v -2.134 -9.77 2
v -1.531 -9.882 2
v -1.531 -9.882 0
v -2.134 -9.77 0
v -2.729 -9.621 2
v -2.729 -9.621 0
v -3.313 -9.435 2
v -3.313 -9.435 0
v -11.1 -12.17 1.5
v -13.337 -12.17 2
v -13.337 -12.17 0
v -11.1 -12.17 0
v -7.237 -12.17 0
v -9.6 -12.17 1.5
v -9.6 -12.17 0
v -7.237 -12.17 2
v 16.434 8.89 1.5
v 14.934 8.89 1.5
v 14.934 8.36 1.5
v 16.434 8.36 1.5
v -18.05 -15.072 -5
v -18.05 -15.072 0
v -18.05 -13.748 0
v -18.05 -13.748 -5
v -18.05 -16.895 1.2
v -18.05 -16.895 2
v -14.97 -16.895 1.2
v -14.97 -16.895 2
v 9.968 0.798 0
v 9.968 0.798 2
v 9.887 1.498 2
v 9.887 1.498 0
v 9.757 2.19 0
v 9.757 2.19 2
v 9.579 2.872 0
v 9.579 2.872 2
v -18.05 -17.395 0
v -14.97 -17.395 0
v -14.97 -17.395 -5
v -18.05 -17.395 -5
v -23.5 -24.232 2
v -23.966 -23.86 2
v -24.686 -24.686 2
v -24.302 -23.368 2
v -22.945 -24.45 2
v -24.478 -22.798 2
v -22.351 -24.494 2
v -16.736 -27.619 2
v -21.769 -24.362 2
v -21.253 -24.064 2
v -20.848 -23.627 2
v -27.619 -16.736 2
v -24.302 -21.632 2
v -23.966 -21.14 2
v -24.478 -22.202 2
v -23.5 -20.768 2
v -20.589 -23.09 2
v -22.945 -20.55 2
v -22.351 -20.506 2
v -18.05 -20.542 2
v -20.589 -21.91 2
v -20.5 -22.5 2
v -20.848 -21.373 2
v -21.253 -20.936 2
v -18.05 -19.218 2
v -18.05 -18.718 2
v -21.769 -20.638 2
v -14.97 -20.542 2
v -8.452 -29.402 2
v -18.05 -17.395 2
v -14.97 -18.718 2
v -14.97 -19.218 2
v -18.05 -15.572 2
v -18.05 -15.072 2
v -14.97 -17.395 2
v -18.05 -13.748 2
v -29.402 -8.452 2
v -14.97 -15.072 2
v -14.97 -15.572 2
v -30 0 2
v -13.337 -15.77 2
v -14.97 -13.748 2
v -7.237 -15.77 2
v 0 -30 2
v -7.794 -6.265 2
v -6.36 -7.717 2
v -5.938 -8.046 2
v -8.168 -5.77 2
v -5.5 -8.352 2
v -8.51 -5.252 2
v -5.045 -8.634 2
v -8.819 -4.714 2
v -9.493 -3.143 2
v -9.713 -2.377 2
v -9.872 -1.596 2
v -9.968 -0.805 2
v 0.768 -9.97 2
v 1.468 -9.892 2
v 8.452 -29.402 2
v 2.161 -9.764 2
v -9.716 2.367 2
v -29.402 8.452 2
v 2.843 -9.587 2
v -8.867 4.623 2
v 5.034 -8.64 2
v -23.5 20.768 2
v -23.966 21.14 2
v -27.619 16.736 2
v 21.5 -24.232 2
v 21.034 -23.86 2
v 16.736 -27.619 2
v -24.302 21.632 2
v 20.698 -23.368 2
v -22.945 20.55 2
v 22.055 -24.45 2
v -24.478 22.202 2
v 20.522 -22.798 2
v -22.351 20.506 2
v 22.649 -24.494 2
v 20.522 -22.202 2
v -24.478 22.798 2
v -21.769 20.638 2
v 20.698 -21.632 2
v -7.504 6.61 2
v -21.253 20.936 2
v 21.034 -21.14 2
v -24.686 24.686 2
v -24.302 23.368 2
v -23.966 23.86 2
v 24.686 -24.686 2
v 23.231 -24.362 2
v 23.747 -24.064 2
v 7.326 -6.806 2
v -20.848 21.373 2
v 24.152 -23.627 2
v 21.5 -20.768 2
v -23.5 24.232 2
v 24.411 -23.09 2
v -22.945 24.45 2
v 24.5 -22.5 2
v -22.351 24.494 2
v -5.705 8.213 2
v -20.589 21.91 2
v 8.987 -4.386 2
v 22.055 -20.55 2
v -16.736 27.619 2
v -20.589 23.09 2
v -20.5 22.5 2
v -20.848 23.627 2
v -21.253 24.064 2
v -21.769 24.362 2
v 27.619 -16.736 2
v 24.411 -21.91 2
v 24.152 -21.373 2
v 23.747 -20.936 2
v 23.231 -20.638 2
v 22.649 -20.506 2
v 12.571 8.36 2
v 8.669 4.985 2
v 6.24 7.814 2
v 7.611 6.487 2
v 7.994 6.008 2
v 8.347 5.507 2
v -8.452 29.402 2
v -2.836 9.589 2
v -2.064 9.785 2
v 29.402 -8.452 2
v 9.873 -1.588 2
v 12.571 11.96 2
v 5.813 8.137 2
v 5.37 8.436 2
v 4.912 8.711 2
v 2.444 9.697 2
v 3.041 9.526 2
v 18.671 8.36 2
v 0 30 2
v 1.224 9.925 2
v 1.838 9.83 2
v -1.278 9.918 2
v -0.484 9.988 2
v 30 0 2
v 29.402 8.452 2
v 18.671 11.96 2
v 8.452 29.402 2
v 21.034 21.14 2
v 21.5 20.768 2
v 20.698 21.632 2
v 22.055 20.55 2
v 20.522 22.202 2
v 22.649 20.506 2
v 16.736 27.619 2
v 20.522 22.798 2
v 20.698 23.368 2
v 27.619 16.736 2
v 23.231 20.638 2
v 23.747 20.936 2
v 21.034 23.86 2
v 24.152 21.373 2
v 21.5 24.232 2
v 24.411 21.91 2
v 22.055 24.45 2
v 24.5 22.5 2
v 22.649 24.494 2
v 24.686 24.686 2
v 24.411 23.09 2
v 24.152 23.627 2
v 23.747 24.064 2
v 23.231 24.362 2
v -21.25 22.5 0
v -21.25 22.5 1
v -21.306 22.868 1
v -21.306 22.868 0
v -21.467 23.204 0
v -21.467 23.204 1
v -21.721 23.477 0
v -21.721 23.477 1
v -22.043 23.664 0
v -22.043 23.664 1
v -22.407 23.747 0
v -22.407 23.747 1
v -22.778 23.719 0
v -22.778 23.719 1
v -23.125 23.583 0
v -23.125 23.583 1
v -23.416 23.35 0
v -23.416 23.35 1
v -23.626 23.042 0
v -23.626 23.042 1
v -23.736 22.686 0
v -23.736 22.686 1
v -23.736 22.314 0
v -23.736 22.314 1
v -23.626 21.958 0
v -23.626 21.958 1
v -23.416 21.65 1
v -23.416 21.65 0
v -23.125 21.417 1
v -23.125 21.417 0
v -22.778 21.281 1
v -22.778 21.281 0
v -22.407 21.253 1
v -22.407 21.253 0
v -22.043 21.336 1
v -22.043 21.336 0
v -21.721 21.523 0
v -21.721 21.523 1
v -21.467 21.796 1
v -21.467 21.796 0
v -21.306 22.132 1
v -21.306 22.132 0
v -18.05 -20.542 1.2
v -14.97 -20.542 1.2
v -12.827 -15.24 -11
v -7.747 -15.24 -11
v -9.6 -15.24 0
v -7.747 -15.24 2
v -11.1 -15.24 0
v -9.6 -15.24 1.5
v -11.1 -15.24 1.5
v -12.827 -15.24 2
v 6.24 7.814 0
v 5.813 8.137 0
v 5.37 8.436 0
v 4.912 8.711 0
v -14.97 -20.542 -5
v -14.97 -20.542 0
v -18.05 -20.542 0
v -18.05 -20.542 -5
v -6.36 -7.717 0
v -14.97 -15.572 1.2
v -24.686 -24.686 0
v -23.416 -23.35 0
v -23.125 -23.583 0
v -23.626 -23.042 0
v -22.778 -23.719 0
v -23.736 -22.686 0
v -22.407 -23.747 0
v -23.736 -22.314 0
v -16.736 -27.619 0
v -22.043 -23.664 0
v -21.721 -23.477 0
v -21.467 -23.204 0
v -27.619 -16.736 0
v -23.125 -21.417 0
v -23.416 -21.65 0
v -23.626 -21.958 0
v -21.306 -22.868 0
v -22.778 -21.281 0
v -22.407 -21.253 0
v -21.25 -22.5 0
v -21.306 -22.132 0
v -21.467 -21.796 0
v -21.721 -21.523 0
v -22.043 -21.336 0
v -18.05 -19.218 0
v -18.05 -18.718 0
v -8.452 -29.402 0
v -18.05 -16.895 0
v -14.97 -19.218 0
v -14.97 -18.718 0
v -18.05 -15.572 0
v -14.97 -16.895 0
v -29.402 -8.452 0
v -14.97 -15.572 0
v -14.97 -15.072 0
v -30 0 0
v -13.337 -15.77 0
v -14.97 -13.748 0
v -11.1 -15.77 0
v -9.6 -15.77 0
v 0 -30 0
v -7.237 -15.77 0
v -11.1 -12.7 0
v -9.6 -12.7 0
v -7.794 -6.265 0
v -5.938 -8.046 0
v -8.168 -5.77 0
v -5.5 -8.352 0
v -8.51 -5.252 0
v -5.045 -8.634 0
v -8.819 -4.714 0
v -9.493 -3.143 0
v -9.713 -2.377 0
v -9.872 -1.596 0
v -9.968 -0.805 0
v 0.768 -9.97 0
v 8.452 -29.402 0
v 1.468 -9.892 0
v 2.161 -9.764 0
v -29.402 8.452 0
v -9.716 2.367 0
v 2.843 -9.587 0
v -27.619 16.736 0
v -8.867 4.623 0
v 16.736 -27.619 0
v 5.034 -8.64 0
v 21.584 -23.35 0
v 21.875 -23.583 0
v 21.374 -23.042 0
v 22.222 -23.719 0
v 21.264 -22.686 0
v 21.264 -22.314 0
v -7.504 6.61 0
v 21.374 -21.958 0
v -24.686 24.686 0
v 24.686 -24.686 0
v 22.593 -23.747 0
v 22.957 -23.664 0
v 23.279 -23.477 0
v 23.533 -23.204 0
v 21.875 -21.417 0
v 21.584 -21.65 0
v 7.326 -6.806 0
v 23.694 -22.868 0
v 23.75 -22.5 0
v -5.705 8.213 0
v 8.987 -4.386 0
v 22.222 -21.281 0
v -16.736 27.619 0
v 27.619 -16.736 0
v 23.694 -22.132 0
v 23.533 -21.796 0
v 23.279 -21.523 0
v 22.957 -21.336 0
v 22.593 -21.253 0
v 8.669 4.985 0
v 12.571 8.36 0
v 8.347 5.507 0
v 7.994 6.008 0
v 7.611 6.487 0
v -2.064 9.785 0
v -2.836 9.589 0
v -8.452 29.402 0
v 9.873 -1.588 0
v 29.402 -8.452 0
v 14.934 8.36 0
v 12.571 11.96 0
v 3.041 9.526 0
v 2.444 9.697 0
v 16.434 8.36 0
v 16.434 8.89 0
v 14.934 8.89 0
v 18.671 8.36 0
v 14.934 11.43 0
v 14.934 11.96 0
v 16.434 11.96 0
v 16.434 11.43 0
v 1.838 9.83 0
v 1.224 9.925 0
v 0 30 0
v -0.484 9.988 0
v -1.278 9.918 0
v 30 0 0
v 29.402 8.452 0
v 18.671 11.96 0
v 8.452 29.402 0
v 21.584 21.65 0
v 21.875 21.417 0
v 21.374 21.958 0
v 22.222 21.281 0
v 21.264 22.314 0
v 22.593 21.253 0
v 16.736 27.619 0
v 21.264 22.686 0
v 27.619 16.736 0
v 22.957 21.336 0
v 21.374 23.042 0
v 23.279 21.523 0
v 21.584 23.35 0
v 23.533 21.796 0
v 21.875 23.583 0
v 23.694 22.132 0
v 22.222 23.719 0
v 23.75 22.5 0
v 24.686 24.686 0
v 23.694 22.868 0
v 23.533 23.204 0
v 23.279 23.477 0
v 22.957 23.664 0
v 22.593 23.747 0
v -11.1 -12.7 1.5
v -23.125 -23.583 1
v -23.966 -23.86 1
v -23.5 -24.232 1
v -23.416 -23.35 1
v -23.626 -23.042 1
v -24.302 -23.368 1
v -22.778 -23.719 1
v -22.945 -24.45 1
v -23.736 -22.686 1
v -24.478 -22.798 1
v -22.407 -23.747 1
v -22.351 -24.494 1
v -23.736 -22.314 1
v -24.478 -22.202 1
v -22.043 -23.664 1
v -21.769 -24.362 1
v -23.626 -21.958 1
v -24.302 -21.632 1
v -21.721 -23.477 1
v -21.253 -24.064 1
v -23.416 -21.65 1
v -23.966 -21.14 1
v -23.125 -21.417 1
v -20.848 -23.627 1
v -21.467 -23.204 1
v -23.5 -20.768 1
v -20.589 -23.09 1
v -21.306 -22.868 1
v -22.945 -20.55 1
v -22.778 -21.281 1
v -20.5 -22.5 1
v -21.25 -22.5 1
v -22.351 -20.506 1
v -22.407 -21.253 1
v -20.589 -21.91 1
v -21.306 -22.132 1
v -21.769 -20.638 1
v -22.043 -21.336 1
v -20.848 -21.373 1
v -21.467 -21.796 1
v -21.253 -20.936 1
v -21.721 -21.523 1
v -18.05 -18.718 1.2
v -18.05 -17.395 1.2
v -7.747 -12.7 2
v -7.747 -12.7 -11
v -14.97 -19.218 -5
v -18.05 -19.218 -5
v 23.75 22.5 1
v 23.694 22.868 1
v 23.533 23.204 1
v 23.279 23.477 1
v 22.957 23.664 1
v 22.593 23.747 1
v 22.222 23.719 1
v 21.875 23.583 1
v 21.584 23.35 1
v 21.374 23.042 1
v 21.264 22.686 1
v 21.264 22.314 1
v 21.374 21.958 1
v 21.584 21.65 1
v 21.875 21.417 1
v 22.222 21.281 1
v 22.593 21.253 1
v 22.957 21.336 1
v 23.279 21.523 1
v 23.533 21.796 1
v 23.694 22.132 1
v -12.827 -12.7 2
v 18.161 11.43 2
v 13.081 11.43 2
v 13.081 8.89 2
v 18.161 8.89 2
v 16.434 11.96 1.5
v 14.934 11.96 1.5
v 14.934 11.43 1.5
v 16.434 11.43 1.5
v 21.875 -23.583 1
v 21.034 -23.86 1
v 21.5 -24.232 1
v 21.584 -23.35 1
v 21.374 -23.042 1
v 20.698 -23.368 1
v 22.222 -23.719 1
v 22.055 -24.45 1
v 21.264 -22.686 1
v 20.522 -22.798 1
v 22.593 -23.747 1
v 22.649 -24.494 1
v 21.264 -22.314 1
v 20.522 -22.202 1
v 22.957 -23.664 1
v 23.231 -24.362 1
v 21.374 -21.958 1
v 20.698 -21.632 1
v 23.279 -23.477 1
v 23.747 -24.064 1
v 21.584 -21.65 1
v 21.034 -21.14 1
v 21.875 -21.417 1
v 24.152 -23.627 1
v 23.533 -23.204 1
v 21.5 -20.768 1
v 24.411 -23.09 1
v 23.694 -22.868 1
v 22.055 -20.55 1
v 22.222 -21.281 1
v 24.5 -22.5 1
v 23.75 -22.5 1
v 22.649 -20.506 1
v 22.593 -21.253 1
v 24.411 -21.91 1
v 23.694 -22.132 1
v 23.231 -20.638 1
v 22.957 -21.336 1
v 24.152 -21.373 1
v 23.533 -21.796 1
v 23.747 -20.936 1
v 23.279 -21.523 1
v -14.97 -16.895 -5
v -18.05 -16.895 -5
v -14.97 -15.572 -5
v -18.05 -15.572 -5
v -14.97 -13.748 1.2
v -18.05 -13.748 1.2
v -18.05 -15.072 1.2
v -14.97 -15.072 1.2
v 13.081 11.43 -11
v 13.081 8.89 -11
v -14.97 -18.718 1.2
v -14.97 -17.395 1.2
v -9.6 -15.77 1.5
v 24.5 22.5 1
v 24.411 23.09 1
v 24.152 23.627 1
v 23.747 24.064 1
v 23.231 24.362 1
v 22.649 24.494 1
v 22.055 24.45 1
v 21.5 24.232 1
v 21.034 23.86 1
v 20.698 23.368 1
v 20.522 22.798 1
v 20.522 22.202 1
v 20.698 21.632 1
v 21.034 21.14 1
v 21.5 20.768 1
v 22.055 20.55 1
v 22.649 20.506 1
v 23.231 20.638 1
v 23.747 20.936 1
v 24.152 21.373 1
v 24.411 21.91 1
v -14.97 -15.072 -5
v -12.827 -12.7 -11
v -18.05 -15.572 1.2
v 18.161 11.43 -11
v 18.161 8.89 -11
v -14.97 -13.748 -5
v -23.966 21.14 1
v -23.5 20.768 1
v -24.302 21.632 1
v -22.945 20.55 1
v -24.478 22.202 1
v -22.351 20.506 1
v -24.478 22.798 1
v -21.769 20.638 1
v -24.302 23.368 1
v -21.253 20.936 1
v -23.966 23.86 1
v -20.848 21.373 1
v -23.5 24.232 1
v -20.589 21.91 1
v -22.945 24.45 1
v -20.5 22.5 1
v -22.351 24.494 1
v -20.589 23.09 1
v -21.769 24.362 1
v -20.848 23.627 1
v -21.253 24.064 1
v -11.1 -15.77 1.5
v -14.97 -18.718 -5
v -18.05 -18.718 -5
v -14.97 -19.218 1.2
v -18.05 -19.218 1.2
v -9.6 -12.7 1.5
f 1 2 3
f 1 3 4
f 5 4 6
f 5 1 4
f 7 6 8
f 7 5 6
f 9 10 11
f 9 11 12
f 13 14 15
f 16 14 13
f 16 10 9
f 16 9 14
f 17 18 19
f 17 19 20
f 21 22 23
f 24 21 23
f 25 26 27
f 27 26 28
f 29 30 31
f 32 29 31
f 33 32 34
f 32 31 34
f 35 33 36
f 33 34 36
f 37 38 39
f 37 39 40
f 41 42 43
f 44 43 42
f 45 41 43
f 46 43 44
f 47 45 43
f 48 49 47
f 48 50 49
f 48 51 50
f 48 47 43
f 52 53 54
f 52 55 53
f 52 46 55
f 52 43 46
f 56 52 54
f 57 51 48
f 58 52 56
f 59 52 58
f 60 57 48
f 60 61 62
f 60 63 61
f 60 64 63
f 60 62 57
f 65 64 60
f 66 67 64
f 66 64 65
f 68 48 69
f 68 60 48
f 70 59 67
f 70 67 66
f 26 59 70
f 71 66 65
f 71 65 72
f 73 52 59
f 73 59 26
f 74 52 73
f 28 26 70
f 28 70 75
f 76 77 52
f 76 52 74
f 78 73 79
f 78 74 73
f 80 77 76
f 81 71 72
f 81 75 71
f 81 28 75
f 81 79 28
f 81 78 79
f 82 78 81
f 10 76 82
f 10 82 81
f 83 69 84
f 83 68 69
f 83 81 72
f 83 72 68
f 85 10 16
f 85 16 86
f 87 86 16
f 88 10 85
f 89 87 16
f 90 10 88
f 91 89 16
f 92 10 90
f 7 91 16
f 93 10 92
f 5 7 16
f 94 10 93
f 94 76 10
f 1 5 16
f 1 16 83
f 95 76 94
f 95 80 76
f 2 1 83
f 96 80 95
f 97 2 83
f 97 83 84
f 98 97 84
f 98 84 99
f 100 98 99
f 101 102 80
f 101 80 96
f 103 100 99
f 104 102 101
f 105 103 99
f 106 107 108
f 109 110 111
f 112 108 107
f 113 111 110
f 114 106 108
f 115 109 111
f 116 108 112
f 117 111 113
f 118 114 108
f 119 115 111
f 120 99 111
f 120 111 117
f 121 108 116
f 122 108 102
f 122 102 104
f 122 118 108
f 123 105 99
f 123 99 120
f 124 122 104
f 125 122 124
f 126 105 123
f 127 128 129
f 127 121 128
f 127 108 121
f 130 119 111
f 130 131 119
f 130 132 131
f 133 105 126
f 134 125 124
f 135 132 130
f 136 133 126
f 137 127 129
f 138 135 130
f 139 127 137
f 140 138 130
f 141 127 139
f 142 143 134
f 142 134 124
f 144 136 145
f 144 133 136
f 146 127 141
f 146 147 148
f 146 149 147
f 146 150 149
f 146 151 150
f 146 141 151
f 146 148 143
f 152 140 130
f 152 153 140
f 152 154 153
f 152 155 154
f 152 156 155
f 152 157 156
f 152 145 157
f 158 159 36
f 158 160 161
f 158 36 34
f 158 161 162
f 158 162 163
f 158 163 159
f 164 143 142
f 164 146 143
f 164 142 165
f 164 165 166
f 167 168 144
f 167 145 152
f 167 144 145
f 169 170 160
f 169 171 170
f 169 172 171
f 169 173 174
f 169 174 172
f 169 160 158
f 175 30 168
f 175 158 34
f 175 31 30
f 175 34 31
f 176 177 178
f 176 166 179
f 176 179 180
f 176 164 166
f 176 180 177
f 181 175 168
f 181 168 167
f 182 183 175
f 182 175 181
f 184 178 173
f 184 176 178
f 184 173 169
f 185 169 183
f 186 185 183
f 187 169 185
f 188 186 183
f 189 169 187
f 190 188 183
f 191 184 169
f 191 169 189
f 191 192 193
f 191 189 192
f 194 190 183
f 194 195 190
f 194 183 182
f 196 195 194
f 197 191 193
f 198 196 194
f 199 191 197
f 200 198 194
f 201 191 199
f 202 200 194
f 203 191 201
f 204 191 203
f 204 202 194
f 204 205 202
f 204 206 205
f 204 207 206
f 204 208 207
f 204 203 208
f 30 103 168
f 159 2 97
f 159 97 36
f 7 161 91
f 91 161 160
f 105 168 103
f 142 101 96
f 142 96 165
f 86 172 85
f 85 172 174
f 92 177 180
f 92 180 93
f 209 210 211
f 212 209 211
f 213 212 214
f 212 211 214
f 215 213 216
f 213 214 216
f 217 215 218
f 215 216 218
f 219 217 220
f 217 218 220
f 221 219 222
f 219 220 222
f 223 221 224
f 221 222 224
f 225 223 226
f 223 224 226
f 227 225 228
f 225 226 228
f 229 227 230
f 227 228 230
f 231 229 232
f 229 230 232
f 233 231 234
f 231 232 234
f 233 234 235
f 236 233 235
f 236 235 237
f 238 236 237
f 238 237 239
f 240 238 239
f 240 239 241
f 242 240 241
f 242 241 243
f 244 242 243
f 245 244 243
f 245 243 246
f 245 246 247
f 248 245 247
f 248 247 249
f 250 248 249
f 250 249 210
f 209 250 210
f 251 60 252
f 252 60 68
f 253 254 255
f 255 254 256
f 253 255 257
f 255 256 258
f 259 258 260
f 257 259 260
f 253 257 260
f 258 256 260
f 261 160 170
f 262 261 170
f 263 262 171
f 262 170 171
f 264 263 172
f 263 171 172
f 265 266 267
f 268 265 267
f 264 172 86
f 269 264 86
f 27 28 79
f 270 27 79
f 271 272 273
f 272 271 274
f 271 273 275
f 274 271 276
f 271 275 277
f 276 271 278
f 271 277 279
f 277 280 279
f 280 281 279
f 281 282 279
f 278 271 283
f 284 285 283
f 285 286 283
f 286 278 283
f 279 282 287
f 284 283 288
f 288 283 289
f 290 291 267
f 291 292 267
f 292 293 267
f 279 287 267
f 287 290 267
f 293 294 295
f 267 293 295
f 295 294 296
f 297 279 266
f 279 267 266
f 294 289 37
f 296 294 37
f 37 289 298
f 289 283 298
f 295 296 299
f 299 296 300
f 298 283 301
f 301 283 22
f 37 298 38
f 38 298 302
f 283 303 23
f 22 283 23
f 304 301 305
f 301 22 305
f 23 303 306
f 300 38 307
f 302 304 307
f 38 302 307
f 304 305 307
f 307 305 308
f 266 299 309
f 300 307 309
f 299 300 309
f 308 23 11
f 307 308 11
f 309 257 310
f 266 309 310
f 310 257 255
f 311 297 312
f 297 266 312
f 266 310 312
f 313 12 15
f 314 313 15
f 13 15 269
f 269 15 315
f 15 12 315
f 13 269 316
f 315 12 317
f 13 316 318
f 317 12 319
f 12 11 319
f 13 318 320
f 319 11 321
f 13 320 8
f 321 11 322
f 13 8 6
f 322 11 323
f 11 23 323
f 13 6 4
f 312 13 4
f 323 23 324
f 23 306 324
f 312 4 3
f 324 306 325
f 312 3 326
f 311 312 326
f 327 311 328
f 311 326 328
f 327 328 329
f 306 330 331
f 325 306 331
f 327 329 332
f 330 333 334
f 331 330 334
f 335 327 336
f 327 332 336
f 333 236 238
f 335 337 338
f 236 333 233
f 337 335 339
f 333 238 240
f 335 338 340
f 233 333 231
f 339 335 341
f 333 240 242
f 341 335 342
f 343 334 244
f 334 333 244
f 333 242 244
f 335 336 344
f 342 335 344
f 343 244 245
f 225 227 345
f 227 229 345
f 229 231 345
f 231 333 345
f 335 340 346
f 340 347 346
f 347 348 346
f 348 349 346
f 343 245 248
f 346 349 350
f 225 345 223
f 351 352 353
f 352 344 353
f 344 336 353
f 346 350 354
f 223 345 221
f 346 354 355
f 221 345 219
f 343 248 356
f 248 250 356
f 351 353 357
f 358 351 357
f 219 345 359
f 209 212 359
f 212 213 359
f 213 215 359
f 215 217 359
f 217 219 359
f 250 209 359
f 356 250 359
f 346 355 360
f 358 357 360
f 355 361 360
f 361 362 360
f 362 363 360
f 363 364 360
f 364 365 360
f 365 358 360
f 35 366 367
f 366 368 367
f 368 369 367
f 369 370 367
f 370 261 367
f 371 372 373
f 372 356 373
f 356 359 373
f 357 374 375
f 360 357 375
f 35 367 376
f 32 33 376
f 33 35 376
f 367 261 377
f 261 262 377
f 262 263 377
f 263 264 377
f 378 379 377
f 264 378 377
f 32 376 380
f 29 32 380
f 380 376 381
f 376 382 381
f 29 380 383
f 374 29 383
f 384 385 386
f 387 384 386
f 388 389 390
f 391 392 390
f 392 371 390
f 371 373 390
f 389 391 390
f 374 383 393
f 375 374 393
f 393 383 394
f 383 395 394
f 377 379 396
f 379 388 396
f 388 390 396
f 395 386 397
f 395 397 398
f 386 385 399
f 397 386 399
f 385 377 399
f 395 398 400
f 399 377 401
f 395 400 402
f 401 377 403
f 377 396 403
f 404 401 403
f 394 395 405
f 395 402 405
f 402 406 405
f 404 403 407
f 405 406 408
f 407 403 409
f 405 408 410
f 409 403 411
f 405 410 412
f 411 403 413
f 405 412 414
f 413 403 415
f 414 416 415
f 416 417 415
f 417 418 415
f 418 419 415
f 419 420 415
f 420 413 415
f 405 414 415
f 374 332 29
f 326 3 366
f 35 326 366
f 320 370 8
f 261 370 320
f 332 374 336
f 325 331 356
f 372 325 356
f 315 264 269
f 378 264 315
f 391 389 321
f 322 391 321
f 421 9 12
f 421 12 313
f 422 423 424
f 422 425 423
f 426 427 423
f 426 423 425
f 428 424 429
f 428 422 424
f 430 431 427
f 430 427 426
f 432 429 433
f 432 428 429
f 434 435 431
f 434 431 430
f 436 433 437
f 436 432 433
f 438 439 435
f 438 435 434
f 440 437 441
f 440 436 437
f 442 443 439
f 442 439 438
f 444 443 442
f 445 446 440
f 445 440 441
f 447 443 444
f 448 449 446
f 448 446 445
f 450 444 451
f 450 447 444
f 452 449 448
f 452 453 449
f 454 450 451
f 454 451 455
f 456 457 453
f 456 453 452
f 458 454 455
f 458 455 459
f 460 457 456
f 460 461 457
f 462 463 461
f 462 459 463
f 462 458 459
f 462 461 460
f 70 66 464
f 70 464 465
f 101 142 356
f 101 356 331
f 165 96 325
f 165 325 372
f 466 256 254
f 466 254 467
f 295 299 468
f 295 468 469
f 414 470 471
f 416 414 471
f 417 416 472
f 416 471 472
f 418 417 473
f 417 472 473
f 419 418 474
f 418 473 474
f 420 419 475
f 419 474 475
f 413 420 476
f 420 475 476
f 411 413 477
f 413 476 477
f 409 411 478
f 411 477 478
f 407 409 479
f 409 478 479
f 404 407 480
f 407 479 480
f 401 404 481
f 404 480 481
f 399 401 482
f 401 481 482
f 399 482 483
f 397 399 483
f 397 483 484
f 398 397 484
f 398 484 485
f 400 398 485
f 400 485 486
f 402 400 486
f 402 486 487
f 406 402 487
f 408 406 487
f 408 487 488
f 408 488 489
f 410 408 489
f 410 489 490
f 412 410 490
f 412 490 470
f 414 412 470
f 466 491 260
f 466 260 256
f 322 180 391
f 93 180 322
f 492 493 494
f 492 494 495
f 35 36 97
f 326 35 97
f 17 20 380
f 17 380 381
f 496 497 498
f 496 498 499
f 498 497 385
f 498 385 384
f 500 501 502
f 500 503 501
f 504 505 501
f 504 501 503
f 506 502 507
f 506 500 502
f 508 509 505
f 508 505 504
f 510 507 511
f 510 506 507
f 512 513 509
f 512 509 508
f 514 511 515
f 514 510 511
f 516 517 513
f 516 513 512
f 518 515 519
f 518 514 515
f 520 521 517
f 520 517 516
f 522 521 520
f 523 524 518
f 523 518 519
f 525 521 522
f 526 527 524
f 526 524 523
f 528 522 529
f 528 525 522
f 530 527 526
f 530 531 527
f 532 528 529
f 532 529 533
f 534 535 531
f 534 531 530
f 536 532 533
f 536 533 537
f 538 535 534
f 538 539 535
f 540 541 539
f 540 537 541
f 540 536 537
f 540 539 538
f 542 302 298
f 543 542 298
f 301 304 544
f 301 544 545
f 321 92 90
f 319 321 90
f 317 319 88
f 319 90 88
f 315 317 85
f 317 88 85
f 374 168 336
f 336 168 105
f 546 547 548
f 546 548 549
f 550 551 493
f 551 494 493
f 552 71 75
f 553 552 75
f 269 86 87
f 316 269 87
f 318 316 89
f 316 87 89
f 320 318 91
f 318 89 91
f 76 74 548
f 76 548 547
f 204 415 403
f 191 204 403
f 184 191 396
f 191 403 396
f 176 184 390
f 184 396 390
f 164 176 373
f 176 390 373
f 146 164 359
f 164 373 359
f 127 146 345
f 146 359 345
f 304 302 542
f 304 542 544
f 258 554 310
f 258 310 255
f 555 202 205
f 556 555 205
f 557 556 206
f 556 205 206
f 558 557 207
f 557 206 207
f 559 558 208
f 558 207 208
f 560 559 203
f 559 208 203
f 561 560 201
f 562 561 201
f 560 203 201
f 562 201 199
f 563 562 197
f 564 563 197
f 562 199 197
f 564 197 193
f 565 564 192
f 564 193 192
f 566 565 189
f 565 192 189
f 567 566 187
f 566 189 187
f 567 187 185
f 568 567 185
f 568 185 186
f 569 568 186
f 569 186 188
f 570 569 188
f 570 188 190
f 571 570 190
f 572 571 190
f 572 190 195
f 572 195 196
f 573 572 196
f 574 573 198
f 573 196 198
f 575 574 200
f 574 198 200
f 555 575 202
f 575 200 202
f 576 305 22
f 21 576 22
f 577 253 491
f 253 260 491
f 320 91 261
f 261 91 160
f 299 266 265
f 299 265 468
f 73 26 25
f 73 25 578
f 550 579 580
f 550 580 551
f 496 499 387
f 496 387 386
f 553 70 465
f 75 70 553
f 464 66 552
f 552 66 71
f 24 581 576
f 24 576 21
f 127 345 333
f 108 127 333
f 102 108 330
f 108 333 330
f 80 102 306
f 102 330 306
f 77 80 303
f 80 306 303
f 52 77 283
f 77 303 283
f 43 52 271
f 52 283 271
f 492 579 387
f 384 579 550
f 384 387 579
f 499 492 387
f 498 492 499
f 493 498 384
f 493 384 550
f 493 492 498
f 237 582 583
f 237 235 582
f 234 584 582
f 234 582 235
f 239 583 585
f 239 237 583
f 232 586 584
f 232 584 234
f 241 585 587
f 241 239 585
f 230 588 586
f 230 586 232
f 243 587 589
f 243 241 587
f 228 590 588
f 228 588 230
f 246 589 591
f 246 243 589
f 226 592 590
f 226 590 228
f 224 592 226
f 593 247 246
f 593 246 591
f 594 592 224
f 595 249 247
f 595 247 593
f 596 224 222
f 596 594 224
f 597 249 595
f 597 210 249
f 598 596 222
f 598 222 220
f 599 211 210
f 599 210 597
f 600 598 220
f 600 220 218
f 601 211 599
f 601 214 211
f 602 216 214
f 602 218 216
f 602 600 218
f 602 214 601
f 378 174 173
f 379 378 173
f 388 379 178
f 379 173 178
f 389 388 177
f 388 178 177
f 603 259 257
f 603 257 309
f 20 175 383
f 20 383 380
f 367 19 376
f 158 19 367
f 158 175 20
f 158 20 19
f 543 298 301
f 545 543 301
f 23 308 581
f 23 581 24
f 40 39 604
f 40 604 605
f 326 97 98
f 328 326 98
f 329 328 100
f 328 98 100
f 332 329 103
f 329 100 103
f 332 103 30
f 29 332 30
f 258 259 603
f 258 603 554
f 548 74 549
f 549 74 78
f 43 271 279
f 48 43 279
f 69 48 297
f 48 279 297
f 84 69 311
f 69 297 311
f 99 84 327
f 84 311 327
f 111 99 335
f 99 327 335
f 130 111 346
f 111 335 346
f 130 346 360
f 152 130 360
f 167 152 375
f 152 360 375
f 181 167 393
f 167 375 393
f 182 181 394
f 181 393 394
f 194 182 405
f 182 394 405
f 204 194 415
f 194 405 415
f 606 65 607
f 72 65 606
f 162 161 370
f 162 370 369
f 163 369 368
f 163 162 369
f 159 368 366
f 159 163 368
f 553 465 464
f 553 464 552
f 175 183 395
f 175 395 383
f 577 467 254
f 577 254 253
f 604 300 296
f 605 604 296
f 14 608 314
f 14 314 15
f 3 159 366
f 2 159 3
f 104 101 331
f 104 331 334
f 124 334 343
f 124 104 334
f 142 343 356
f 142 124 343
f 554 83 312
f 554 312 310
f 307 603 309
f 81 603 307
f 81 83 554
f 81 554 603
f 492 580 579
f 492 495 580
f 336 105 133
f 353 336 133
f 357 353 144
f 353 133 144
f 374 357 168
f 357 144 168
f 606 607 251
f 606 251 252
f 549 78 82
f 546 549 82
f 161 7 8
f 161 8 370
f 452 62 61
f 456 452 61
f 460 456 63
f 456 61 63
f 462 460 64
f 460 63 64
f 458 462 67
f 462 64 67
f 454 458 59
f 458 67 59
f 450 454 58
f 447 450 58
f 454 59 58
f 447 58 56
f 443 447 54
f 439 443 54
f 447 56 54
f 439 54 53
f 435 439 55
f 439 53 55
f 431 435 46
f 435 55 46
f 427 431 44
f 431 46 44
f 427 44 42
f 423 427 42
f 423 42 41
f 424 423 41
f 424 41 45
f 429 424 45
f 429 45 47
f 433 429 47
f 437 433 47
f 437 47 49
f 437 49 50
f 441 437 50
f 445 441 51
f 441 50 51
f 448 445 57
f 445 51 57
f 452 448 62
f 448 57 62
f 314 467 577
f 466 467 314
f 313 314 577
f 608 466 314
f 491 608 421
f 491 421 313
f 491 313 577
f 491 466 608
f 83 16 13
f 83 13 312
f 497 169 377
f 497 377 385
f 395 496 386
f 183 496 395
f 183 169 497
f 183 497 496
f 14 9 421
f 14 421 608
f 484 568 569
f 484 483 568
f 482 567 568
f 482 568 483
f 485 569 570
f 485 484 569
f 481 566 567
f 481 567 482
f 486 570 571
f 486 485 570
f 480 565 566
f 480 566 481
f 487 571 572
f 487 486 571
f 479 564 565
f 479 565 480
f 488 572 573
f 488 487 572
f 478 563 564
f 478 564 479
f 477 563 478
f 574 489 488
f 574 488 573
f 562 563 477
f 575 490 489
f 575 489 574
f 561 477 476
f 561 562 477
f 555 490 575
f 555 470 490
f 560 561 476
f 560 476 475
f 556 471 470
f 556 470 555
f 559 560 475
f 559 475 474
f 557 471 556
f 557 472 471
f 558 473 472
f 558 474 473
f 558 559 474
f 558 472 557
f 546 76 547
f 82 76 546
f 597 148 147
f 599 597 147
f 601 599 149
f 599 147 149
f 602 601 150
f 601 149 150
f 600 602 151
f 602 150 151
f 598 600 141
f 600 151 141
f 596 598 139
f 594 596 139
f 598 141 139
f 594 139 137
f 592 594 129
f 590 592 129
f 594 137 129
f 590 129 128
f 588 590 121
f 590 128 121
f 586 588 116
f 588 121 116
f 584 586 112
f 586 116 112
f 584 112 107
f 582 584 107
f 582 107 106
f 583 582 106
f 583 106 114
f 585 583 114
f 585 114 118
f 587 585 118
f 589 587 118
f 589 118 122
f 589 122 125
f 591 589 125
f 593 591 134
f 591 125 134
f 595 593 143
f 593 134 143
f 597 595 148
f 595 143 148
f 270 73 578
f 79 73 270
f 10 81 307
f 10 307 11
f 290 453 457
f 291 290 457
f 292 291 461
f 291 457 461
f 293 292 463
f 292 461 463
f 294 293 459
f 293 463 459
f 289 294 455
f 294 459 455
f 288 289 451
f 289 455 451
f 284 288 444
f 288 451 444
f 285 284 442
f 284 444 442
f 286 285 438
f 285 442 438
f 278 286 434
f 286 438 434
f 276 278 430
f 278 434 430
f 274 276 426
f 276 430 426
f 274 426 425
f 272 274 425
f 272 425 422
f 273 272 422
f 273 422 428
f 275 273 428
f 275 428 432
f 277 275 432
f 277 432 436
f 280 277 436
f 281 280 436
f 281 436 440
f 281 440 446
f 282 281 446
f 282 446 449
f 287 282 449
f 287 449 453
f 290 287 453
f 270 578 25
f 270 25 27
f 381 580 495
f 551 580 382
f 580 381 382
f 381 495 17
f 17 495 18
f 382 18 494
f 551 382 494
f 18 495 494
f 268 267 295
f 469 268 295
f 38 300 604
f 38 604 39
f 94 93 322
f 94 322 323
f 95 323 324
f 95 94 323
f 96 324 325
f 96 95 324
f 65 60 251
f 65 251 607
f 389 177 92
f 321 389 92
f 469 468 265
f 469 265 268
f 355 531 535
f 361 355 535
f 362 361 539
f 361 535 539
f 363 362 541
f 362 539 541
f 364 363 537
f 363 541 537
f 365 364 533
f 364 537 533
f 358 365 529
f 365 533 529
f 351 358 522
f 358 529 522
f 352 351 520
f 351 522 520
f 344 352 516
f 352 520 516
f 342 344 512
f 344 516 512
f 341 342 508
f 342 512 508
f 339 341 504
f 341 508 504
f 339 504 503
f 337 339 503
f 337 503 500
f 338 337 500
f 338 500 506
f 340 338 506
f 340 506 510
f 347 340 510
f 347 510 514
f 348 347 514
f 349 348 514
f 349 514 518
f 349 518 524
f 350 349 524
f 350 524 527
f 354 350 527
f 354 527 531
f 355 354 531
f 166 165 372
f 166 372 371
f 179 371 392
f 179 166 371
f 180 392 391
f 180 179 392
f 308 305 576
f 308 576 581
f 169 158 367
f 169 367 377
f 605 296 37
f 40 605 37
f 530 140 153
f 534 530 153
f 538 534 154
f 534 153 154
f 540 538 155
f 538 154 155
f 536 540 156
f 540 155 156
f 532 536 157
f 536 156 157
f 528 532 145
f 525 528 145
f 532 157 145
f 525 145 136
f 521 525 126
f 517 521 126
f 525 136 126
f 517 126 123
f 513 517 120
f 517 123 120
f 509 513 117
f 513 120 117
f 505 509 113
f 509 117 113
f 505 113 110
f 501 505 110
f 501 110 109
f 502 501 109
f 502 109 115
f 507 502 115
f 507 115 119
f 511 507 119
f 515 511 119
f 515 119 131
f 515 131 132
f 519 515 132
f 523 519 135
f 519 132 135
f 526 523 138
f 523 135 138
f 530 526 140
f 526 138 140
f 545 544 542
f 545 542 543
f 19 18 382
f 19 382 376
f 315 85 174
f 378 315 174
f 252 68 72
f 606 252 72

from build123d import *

# Parameters (mm, degrees)
EXTRUDE_1_DEPTH     = 2
SKETCH_3_R          = 1.25
CUT_EXTRUDE_1_DEPTH = 2
SKETCH_4_R          = 2
CUT_EXTRUDE_2_DEPTH = 1
SKETCH_6_W          = 3.080004
SKETCH_6_H          = 6.793992
EXTRUDE_2_DEPTH     = 5
CUT_EXTRUDE_START   = -5
SKETCH_7_W          = 3.080004
SKETCH_7_H          = 0.5
CUT_EXTRUDE_4_DEPTH = 5
CUT_EXTRUDE_5_DEPTH = 5
SKETCH_9_W          = 3.080004
SKETCH_9_H          = 1.323498
CUT_EXTRUDE_6_DEPTH = 0.8
CUT_EXTRUDE_7_DEPTH = 3
SKETCH_11_W         = 1.5
SKETCH_11_H         = 0.5299964
SKETCH_11_H_2       = 0.5300218
CUT_EXTRUDE_8_DEPTH = 0.5
SKETCH_12_W         = 5.08
SKETCH_12_H         = 2.54
EXTRUDE_3_DEPTH     = 11


with BuildPart() as part:
    # 草图2 → 凸台-拉伸1 (new body)
    with BuildSketch(Plane.XY):
        with BuildLine():
            ThreePointArc((24.686269666, 24.686269666), (0, 30), (-24.686269666, 24.686269666))
            ThreePointArc((-24.686269666, 24.686269666), (-30, 0), (-24.686269666, -24.686269666))
            ThreePointArc((-24.686269666, -24.686269666), (0, -30), (24.686269666, -24.686269666))
            ThreePointArc((24.686269666, -24.686269666), (30, 0), (24.686269666, 24.686269666))
        make_face()
    extrude(amount=EXTRUDE_1_DEPTH)

    # 草图3 → 切除-拉伸1 (cut)
    with BuildSketch(Plane.XY.offset(2)):
        with Locations((-22.5, 22.5)):
            Circle(SKETCH_3_R)
        with Locations((22.5, 22.5)):
            Circle(SKETCH_3_R)
        with Locations((-22.5, -22.5)):
            Circle(SKETCH_3_R)
        with Locations((22.5, -22.5)):
            Circle(SKETCH_3_R)
    extrude(amount=-CUT_EXTRUDE_1_DEPTH, mode=Mode.SUBTRACT)

    # 草图4 → 切除-拉伸2 (cut)
    with BuildSketch(Plane.XY.offset(2)):
        with Locations((-22.5, 22.5)):
            Circle(SKETCH_4_R)
        with Locations((22.5, 22.5)):
            Circle(SKETCH_4_R)
        with Locations((22.5, -22.5)):
            Circle(SKETCH_4_R)
        with Locations((-22.5, -22.5)):
            Circle(SKETCH_4_R)
    extrude(amount=-CUT_EXTRUDE_2_DEPTH, mode=Mode.SUBTRACT)

    # 草图6 → 凸台-拉伸2 (add)
    with BuildSketch(Plane(origin=(0, 0, 0), x_dir=(-1, 0, 0), z_dir=(0, 0, -1))):
        with Locations((16.51, -17.145)):
            Rectangle(SKETCH_6_W, SKETCH_6_H)
    extrude(amount=EXTRUDE_2_DEPTH)

    # 草图7 → 切除-拉伸4 (cut)
    with BuildSketch(Plane(origin=(0, 0, -5), x_dir=(-1, 0, 0), z_dir=(0, 0, -1)).offset(CUT_EXTRUDE_START)):
        with Locations((16.51, -15.321502)):
            Rectangle(SKETCH_7_W, SKETCH_7_H)
        with Locations((16.51, -17.145)):
            Rectangle(SKETCH_7_W, SKETCH_7_H)
        with Locations((16.51, -18.968498)):
            Rectangle(SKETCH_7_W, SKETCH_7_H)
    extrude(amount=CUT_EXTRUDE_4_DEPTH, mode=Mode.SUBTRACT)

    # 草图8 → 切除-拉伸5 (cut)
    with BuildSketch(Plane.XY.offset(2)):
        with BuildLine():
            Line((4.91157439, 8.710708181), (-6.35957061, -7.717244434))
            ThreePointArc((-6.35957061, -7.717244434), (-5.720805987, -8.201974083), (-5.04525755, -8.633966427))
            Line((-5.04525755, -8.633966427), (6.239861639, 7.81435389))
            ThreePointArc((6.239861639, 7.81435389), (5.593701291, 8.289180048), (4.91157439, 8.710708181))
        make_face()
        with BuildLine():
            Line((-0.483946584, 9.988282921), (-9.493244962, -3.142976312))
            ThreePointArc((-9.493244962, -3.142976312), (-9.800391035, -1.988048178), (-9.967568149, -0.804726786))
            Line((-9.967568149, -0.804726786), (-2.836233135, 9.589357726))
            ThreePointArc((-2.836233135, 9.589357726), (-1.672029805, 9.859224936), (-0.483946584, 9.988282921))
        make_face()
        with BuildLine():
            Line((-5.705235003, 8.212812768), (-9.715721467, 2.367436669))
            ThreePointArc((-9.715721467, 2.367436669), (-8.245821975, 5.65742167), (-5.705235003, 8.212812768))
        make_face()
        with BuildLine():
            Line((9.578841572, 2.871549083), (0.767992477, -9.970465764))
            ThreePointArc((0.767992477, -9.970465764), (1.815657886, -9.833788001), (2.843055403, -9.587337272))
            Line((2.843055403, -9.587337272), (9.968138202, 0.797634494))
            ThreePointArc((9.968138202, 0.797634494), (9.828345995, 1.844888885), (9.578841572, 2.871549083))
        make_face()
        with BuildLine():
            Line((9.873157751, -1.587688896), (5.034385744, -8.64031019))
            ThreePointArc((5.034385744, -8.64031019), (8.245821975, -5.65742167), (9.873157751, -1.587688896))
        make_face()
        with BuildLine():
            Line((1.224216457, 9.924781815), (-8.819278945, -4.713843325))
            ThreePointArc((-8.819278945, -4.713843325), (-8.34274934, -5.513486506), (-7.793929004, -6.265354793))
            Line((-7.793929004, -6.265354793), (3.040773833, 9.52647335))
            ThreePointArc((3.040773833, 9.52647335), (2.141774487, 9.767947689), (1.224216457, 9.924781815))
        make_face()
        with BuildLine():
            Line((8.668880472, 4.985028723), (-1.53135707, -9.882051686))
            ThreePointArc((-1.53135707, -9.882051686), (-2.432490647, -9.699638614), (-3.313061985, -9.435232921))
            Line((-3.313061985, -9.435232921), (7.610812743, 6.4865653))
            ThreePointArc((7.610812743, 6.4865653), (8.174396358, 5.760142723), (8.668880472, 4.985028723))
        make_face()
    extrude(amount=-CUT_EXTRUDE_5_DEPTH, mode=Mode.SUBTRACT)

    # 草图9 → 切除-拉伸6 (cut)
    with BuildSketch(Plane.XY.offset(2)):
        with Locations((-16.51, -14.409753)):
            Rectangle(SKETCH_9_W, SKETCH_9_H)
        with Locations((-16.51, -16.233251)):
            Rectangle(SKETCH_9_W, SKETCH_9_H)
        with Locations((-16.51, -18.056749)):
            Rectangle(SKETCH_9_W, SKETCH_9_H)
        with Locations((-16.51, -19.880247)):
            Rectangle(SKETCH_9_W, SKETCH_9_H)
    extrude(amount=-CUT_EXTRUDE_6_DEPTH, mode=Mode.SUBTRACT)

    # 草图10 → 切除-拉伸7 (cut)
    with BuildSketch(Plane.XY.offset(2)):
        Polygon((-11.1005, -12.1700036), (-11.1005, -12.7), (-12.827, -12.7), (-12.827, -15.24), (-11.1005, -15.24), (-11.1005, -15.7700218), (-13.3369812, -15.7700218), (-13.3369812, -12.1700036), align=None)
        Polygon((-7.2369934, -12.1700036), (-7.2369934, -15.7700218), (-9.6005, -15.7700218), (-9.6005, -15.24), (-7.747, -15.24), (-7.747, -12.7), (-9.6005, -12.7), (-9.6005, -12.1700036), align=None)
        Polygon((12.5709934, 11.9600218), (14.9345, 11.9600218), (14.9345, 11.43), (13.081, 11.43), (13.081, 8.89), (14.9345, 8.89), (14.9345, 8.3600036), (12.5709934, 8.3600036), align=None)
        Polygon((18.6709812, 11.9600218), (18.6709812, 8.3600036), (16.4345, 8.3600036), (16.4345, 8.89), (18.161, 8.89), (18.161, 11.43), (16.4345, 11.43), (16.4345, 11.9600218), align=None)
    extrude(amount=-CUT_EXTRUDE_7_DEPTH, mode=Mode.SUBTRACT)

    # 草图11 → 切除-拉伸8 (cut)
    with BuildSketch(Plane.XY.offset(2)):
        with Locations((-10.3505, -12.4350018)):
            Rectangle(SKETCH_11_W, SKETCH_11_H)
        with Locations((-10.3505, -15.5050109)):
            Rectangle(SKETCH_11_W, SKETCH_11_H_2)
        with Locations((15.6845, 11.6950109)):
            Rectangle(SKETCH_11_W, SKETCH_11_H_2)
        with Locations((15.6845, 8.6250018)):
            Rectangle(SKETCH_11_W, SKETCH_11_H)
    extrude(amount=-CUT_EXTRUDE_8_DEPTH, mode=Mode.SUBTRACT)

    # 草图12 → 凸台-拉伸3 (add)
    with BuildSketch(Plane(origin=(0, 0, 0), x_dir=(-1, 0, 0), z_dir=(0, 0, -1))):
        with Locations((-15.621, 10.16)):
            Rectangle(SKETCH_12_W, SKETCH_12_H)
        with Locations((10.287, -13.97)):
            Rectangle(SKETCH_12_W, SKETCH_12_H)
    extrude(amount=EXTRUDE_3_DEPTH)


solid = part.part
